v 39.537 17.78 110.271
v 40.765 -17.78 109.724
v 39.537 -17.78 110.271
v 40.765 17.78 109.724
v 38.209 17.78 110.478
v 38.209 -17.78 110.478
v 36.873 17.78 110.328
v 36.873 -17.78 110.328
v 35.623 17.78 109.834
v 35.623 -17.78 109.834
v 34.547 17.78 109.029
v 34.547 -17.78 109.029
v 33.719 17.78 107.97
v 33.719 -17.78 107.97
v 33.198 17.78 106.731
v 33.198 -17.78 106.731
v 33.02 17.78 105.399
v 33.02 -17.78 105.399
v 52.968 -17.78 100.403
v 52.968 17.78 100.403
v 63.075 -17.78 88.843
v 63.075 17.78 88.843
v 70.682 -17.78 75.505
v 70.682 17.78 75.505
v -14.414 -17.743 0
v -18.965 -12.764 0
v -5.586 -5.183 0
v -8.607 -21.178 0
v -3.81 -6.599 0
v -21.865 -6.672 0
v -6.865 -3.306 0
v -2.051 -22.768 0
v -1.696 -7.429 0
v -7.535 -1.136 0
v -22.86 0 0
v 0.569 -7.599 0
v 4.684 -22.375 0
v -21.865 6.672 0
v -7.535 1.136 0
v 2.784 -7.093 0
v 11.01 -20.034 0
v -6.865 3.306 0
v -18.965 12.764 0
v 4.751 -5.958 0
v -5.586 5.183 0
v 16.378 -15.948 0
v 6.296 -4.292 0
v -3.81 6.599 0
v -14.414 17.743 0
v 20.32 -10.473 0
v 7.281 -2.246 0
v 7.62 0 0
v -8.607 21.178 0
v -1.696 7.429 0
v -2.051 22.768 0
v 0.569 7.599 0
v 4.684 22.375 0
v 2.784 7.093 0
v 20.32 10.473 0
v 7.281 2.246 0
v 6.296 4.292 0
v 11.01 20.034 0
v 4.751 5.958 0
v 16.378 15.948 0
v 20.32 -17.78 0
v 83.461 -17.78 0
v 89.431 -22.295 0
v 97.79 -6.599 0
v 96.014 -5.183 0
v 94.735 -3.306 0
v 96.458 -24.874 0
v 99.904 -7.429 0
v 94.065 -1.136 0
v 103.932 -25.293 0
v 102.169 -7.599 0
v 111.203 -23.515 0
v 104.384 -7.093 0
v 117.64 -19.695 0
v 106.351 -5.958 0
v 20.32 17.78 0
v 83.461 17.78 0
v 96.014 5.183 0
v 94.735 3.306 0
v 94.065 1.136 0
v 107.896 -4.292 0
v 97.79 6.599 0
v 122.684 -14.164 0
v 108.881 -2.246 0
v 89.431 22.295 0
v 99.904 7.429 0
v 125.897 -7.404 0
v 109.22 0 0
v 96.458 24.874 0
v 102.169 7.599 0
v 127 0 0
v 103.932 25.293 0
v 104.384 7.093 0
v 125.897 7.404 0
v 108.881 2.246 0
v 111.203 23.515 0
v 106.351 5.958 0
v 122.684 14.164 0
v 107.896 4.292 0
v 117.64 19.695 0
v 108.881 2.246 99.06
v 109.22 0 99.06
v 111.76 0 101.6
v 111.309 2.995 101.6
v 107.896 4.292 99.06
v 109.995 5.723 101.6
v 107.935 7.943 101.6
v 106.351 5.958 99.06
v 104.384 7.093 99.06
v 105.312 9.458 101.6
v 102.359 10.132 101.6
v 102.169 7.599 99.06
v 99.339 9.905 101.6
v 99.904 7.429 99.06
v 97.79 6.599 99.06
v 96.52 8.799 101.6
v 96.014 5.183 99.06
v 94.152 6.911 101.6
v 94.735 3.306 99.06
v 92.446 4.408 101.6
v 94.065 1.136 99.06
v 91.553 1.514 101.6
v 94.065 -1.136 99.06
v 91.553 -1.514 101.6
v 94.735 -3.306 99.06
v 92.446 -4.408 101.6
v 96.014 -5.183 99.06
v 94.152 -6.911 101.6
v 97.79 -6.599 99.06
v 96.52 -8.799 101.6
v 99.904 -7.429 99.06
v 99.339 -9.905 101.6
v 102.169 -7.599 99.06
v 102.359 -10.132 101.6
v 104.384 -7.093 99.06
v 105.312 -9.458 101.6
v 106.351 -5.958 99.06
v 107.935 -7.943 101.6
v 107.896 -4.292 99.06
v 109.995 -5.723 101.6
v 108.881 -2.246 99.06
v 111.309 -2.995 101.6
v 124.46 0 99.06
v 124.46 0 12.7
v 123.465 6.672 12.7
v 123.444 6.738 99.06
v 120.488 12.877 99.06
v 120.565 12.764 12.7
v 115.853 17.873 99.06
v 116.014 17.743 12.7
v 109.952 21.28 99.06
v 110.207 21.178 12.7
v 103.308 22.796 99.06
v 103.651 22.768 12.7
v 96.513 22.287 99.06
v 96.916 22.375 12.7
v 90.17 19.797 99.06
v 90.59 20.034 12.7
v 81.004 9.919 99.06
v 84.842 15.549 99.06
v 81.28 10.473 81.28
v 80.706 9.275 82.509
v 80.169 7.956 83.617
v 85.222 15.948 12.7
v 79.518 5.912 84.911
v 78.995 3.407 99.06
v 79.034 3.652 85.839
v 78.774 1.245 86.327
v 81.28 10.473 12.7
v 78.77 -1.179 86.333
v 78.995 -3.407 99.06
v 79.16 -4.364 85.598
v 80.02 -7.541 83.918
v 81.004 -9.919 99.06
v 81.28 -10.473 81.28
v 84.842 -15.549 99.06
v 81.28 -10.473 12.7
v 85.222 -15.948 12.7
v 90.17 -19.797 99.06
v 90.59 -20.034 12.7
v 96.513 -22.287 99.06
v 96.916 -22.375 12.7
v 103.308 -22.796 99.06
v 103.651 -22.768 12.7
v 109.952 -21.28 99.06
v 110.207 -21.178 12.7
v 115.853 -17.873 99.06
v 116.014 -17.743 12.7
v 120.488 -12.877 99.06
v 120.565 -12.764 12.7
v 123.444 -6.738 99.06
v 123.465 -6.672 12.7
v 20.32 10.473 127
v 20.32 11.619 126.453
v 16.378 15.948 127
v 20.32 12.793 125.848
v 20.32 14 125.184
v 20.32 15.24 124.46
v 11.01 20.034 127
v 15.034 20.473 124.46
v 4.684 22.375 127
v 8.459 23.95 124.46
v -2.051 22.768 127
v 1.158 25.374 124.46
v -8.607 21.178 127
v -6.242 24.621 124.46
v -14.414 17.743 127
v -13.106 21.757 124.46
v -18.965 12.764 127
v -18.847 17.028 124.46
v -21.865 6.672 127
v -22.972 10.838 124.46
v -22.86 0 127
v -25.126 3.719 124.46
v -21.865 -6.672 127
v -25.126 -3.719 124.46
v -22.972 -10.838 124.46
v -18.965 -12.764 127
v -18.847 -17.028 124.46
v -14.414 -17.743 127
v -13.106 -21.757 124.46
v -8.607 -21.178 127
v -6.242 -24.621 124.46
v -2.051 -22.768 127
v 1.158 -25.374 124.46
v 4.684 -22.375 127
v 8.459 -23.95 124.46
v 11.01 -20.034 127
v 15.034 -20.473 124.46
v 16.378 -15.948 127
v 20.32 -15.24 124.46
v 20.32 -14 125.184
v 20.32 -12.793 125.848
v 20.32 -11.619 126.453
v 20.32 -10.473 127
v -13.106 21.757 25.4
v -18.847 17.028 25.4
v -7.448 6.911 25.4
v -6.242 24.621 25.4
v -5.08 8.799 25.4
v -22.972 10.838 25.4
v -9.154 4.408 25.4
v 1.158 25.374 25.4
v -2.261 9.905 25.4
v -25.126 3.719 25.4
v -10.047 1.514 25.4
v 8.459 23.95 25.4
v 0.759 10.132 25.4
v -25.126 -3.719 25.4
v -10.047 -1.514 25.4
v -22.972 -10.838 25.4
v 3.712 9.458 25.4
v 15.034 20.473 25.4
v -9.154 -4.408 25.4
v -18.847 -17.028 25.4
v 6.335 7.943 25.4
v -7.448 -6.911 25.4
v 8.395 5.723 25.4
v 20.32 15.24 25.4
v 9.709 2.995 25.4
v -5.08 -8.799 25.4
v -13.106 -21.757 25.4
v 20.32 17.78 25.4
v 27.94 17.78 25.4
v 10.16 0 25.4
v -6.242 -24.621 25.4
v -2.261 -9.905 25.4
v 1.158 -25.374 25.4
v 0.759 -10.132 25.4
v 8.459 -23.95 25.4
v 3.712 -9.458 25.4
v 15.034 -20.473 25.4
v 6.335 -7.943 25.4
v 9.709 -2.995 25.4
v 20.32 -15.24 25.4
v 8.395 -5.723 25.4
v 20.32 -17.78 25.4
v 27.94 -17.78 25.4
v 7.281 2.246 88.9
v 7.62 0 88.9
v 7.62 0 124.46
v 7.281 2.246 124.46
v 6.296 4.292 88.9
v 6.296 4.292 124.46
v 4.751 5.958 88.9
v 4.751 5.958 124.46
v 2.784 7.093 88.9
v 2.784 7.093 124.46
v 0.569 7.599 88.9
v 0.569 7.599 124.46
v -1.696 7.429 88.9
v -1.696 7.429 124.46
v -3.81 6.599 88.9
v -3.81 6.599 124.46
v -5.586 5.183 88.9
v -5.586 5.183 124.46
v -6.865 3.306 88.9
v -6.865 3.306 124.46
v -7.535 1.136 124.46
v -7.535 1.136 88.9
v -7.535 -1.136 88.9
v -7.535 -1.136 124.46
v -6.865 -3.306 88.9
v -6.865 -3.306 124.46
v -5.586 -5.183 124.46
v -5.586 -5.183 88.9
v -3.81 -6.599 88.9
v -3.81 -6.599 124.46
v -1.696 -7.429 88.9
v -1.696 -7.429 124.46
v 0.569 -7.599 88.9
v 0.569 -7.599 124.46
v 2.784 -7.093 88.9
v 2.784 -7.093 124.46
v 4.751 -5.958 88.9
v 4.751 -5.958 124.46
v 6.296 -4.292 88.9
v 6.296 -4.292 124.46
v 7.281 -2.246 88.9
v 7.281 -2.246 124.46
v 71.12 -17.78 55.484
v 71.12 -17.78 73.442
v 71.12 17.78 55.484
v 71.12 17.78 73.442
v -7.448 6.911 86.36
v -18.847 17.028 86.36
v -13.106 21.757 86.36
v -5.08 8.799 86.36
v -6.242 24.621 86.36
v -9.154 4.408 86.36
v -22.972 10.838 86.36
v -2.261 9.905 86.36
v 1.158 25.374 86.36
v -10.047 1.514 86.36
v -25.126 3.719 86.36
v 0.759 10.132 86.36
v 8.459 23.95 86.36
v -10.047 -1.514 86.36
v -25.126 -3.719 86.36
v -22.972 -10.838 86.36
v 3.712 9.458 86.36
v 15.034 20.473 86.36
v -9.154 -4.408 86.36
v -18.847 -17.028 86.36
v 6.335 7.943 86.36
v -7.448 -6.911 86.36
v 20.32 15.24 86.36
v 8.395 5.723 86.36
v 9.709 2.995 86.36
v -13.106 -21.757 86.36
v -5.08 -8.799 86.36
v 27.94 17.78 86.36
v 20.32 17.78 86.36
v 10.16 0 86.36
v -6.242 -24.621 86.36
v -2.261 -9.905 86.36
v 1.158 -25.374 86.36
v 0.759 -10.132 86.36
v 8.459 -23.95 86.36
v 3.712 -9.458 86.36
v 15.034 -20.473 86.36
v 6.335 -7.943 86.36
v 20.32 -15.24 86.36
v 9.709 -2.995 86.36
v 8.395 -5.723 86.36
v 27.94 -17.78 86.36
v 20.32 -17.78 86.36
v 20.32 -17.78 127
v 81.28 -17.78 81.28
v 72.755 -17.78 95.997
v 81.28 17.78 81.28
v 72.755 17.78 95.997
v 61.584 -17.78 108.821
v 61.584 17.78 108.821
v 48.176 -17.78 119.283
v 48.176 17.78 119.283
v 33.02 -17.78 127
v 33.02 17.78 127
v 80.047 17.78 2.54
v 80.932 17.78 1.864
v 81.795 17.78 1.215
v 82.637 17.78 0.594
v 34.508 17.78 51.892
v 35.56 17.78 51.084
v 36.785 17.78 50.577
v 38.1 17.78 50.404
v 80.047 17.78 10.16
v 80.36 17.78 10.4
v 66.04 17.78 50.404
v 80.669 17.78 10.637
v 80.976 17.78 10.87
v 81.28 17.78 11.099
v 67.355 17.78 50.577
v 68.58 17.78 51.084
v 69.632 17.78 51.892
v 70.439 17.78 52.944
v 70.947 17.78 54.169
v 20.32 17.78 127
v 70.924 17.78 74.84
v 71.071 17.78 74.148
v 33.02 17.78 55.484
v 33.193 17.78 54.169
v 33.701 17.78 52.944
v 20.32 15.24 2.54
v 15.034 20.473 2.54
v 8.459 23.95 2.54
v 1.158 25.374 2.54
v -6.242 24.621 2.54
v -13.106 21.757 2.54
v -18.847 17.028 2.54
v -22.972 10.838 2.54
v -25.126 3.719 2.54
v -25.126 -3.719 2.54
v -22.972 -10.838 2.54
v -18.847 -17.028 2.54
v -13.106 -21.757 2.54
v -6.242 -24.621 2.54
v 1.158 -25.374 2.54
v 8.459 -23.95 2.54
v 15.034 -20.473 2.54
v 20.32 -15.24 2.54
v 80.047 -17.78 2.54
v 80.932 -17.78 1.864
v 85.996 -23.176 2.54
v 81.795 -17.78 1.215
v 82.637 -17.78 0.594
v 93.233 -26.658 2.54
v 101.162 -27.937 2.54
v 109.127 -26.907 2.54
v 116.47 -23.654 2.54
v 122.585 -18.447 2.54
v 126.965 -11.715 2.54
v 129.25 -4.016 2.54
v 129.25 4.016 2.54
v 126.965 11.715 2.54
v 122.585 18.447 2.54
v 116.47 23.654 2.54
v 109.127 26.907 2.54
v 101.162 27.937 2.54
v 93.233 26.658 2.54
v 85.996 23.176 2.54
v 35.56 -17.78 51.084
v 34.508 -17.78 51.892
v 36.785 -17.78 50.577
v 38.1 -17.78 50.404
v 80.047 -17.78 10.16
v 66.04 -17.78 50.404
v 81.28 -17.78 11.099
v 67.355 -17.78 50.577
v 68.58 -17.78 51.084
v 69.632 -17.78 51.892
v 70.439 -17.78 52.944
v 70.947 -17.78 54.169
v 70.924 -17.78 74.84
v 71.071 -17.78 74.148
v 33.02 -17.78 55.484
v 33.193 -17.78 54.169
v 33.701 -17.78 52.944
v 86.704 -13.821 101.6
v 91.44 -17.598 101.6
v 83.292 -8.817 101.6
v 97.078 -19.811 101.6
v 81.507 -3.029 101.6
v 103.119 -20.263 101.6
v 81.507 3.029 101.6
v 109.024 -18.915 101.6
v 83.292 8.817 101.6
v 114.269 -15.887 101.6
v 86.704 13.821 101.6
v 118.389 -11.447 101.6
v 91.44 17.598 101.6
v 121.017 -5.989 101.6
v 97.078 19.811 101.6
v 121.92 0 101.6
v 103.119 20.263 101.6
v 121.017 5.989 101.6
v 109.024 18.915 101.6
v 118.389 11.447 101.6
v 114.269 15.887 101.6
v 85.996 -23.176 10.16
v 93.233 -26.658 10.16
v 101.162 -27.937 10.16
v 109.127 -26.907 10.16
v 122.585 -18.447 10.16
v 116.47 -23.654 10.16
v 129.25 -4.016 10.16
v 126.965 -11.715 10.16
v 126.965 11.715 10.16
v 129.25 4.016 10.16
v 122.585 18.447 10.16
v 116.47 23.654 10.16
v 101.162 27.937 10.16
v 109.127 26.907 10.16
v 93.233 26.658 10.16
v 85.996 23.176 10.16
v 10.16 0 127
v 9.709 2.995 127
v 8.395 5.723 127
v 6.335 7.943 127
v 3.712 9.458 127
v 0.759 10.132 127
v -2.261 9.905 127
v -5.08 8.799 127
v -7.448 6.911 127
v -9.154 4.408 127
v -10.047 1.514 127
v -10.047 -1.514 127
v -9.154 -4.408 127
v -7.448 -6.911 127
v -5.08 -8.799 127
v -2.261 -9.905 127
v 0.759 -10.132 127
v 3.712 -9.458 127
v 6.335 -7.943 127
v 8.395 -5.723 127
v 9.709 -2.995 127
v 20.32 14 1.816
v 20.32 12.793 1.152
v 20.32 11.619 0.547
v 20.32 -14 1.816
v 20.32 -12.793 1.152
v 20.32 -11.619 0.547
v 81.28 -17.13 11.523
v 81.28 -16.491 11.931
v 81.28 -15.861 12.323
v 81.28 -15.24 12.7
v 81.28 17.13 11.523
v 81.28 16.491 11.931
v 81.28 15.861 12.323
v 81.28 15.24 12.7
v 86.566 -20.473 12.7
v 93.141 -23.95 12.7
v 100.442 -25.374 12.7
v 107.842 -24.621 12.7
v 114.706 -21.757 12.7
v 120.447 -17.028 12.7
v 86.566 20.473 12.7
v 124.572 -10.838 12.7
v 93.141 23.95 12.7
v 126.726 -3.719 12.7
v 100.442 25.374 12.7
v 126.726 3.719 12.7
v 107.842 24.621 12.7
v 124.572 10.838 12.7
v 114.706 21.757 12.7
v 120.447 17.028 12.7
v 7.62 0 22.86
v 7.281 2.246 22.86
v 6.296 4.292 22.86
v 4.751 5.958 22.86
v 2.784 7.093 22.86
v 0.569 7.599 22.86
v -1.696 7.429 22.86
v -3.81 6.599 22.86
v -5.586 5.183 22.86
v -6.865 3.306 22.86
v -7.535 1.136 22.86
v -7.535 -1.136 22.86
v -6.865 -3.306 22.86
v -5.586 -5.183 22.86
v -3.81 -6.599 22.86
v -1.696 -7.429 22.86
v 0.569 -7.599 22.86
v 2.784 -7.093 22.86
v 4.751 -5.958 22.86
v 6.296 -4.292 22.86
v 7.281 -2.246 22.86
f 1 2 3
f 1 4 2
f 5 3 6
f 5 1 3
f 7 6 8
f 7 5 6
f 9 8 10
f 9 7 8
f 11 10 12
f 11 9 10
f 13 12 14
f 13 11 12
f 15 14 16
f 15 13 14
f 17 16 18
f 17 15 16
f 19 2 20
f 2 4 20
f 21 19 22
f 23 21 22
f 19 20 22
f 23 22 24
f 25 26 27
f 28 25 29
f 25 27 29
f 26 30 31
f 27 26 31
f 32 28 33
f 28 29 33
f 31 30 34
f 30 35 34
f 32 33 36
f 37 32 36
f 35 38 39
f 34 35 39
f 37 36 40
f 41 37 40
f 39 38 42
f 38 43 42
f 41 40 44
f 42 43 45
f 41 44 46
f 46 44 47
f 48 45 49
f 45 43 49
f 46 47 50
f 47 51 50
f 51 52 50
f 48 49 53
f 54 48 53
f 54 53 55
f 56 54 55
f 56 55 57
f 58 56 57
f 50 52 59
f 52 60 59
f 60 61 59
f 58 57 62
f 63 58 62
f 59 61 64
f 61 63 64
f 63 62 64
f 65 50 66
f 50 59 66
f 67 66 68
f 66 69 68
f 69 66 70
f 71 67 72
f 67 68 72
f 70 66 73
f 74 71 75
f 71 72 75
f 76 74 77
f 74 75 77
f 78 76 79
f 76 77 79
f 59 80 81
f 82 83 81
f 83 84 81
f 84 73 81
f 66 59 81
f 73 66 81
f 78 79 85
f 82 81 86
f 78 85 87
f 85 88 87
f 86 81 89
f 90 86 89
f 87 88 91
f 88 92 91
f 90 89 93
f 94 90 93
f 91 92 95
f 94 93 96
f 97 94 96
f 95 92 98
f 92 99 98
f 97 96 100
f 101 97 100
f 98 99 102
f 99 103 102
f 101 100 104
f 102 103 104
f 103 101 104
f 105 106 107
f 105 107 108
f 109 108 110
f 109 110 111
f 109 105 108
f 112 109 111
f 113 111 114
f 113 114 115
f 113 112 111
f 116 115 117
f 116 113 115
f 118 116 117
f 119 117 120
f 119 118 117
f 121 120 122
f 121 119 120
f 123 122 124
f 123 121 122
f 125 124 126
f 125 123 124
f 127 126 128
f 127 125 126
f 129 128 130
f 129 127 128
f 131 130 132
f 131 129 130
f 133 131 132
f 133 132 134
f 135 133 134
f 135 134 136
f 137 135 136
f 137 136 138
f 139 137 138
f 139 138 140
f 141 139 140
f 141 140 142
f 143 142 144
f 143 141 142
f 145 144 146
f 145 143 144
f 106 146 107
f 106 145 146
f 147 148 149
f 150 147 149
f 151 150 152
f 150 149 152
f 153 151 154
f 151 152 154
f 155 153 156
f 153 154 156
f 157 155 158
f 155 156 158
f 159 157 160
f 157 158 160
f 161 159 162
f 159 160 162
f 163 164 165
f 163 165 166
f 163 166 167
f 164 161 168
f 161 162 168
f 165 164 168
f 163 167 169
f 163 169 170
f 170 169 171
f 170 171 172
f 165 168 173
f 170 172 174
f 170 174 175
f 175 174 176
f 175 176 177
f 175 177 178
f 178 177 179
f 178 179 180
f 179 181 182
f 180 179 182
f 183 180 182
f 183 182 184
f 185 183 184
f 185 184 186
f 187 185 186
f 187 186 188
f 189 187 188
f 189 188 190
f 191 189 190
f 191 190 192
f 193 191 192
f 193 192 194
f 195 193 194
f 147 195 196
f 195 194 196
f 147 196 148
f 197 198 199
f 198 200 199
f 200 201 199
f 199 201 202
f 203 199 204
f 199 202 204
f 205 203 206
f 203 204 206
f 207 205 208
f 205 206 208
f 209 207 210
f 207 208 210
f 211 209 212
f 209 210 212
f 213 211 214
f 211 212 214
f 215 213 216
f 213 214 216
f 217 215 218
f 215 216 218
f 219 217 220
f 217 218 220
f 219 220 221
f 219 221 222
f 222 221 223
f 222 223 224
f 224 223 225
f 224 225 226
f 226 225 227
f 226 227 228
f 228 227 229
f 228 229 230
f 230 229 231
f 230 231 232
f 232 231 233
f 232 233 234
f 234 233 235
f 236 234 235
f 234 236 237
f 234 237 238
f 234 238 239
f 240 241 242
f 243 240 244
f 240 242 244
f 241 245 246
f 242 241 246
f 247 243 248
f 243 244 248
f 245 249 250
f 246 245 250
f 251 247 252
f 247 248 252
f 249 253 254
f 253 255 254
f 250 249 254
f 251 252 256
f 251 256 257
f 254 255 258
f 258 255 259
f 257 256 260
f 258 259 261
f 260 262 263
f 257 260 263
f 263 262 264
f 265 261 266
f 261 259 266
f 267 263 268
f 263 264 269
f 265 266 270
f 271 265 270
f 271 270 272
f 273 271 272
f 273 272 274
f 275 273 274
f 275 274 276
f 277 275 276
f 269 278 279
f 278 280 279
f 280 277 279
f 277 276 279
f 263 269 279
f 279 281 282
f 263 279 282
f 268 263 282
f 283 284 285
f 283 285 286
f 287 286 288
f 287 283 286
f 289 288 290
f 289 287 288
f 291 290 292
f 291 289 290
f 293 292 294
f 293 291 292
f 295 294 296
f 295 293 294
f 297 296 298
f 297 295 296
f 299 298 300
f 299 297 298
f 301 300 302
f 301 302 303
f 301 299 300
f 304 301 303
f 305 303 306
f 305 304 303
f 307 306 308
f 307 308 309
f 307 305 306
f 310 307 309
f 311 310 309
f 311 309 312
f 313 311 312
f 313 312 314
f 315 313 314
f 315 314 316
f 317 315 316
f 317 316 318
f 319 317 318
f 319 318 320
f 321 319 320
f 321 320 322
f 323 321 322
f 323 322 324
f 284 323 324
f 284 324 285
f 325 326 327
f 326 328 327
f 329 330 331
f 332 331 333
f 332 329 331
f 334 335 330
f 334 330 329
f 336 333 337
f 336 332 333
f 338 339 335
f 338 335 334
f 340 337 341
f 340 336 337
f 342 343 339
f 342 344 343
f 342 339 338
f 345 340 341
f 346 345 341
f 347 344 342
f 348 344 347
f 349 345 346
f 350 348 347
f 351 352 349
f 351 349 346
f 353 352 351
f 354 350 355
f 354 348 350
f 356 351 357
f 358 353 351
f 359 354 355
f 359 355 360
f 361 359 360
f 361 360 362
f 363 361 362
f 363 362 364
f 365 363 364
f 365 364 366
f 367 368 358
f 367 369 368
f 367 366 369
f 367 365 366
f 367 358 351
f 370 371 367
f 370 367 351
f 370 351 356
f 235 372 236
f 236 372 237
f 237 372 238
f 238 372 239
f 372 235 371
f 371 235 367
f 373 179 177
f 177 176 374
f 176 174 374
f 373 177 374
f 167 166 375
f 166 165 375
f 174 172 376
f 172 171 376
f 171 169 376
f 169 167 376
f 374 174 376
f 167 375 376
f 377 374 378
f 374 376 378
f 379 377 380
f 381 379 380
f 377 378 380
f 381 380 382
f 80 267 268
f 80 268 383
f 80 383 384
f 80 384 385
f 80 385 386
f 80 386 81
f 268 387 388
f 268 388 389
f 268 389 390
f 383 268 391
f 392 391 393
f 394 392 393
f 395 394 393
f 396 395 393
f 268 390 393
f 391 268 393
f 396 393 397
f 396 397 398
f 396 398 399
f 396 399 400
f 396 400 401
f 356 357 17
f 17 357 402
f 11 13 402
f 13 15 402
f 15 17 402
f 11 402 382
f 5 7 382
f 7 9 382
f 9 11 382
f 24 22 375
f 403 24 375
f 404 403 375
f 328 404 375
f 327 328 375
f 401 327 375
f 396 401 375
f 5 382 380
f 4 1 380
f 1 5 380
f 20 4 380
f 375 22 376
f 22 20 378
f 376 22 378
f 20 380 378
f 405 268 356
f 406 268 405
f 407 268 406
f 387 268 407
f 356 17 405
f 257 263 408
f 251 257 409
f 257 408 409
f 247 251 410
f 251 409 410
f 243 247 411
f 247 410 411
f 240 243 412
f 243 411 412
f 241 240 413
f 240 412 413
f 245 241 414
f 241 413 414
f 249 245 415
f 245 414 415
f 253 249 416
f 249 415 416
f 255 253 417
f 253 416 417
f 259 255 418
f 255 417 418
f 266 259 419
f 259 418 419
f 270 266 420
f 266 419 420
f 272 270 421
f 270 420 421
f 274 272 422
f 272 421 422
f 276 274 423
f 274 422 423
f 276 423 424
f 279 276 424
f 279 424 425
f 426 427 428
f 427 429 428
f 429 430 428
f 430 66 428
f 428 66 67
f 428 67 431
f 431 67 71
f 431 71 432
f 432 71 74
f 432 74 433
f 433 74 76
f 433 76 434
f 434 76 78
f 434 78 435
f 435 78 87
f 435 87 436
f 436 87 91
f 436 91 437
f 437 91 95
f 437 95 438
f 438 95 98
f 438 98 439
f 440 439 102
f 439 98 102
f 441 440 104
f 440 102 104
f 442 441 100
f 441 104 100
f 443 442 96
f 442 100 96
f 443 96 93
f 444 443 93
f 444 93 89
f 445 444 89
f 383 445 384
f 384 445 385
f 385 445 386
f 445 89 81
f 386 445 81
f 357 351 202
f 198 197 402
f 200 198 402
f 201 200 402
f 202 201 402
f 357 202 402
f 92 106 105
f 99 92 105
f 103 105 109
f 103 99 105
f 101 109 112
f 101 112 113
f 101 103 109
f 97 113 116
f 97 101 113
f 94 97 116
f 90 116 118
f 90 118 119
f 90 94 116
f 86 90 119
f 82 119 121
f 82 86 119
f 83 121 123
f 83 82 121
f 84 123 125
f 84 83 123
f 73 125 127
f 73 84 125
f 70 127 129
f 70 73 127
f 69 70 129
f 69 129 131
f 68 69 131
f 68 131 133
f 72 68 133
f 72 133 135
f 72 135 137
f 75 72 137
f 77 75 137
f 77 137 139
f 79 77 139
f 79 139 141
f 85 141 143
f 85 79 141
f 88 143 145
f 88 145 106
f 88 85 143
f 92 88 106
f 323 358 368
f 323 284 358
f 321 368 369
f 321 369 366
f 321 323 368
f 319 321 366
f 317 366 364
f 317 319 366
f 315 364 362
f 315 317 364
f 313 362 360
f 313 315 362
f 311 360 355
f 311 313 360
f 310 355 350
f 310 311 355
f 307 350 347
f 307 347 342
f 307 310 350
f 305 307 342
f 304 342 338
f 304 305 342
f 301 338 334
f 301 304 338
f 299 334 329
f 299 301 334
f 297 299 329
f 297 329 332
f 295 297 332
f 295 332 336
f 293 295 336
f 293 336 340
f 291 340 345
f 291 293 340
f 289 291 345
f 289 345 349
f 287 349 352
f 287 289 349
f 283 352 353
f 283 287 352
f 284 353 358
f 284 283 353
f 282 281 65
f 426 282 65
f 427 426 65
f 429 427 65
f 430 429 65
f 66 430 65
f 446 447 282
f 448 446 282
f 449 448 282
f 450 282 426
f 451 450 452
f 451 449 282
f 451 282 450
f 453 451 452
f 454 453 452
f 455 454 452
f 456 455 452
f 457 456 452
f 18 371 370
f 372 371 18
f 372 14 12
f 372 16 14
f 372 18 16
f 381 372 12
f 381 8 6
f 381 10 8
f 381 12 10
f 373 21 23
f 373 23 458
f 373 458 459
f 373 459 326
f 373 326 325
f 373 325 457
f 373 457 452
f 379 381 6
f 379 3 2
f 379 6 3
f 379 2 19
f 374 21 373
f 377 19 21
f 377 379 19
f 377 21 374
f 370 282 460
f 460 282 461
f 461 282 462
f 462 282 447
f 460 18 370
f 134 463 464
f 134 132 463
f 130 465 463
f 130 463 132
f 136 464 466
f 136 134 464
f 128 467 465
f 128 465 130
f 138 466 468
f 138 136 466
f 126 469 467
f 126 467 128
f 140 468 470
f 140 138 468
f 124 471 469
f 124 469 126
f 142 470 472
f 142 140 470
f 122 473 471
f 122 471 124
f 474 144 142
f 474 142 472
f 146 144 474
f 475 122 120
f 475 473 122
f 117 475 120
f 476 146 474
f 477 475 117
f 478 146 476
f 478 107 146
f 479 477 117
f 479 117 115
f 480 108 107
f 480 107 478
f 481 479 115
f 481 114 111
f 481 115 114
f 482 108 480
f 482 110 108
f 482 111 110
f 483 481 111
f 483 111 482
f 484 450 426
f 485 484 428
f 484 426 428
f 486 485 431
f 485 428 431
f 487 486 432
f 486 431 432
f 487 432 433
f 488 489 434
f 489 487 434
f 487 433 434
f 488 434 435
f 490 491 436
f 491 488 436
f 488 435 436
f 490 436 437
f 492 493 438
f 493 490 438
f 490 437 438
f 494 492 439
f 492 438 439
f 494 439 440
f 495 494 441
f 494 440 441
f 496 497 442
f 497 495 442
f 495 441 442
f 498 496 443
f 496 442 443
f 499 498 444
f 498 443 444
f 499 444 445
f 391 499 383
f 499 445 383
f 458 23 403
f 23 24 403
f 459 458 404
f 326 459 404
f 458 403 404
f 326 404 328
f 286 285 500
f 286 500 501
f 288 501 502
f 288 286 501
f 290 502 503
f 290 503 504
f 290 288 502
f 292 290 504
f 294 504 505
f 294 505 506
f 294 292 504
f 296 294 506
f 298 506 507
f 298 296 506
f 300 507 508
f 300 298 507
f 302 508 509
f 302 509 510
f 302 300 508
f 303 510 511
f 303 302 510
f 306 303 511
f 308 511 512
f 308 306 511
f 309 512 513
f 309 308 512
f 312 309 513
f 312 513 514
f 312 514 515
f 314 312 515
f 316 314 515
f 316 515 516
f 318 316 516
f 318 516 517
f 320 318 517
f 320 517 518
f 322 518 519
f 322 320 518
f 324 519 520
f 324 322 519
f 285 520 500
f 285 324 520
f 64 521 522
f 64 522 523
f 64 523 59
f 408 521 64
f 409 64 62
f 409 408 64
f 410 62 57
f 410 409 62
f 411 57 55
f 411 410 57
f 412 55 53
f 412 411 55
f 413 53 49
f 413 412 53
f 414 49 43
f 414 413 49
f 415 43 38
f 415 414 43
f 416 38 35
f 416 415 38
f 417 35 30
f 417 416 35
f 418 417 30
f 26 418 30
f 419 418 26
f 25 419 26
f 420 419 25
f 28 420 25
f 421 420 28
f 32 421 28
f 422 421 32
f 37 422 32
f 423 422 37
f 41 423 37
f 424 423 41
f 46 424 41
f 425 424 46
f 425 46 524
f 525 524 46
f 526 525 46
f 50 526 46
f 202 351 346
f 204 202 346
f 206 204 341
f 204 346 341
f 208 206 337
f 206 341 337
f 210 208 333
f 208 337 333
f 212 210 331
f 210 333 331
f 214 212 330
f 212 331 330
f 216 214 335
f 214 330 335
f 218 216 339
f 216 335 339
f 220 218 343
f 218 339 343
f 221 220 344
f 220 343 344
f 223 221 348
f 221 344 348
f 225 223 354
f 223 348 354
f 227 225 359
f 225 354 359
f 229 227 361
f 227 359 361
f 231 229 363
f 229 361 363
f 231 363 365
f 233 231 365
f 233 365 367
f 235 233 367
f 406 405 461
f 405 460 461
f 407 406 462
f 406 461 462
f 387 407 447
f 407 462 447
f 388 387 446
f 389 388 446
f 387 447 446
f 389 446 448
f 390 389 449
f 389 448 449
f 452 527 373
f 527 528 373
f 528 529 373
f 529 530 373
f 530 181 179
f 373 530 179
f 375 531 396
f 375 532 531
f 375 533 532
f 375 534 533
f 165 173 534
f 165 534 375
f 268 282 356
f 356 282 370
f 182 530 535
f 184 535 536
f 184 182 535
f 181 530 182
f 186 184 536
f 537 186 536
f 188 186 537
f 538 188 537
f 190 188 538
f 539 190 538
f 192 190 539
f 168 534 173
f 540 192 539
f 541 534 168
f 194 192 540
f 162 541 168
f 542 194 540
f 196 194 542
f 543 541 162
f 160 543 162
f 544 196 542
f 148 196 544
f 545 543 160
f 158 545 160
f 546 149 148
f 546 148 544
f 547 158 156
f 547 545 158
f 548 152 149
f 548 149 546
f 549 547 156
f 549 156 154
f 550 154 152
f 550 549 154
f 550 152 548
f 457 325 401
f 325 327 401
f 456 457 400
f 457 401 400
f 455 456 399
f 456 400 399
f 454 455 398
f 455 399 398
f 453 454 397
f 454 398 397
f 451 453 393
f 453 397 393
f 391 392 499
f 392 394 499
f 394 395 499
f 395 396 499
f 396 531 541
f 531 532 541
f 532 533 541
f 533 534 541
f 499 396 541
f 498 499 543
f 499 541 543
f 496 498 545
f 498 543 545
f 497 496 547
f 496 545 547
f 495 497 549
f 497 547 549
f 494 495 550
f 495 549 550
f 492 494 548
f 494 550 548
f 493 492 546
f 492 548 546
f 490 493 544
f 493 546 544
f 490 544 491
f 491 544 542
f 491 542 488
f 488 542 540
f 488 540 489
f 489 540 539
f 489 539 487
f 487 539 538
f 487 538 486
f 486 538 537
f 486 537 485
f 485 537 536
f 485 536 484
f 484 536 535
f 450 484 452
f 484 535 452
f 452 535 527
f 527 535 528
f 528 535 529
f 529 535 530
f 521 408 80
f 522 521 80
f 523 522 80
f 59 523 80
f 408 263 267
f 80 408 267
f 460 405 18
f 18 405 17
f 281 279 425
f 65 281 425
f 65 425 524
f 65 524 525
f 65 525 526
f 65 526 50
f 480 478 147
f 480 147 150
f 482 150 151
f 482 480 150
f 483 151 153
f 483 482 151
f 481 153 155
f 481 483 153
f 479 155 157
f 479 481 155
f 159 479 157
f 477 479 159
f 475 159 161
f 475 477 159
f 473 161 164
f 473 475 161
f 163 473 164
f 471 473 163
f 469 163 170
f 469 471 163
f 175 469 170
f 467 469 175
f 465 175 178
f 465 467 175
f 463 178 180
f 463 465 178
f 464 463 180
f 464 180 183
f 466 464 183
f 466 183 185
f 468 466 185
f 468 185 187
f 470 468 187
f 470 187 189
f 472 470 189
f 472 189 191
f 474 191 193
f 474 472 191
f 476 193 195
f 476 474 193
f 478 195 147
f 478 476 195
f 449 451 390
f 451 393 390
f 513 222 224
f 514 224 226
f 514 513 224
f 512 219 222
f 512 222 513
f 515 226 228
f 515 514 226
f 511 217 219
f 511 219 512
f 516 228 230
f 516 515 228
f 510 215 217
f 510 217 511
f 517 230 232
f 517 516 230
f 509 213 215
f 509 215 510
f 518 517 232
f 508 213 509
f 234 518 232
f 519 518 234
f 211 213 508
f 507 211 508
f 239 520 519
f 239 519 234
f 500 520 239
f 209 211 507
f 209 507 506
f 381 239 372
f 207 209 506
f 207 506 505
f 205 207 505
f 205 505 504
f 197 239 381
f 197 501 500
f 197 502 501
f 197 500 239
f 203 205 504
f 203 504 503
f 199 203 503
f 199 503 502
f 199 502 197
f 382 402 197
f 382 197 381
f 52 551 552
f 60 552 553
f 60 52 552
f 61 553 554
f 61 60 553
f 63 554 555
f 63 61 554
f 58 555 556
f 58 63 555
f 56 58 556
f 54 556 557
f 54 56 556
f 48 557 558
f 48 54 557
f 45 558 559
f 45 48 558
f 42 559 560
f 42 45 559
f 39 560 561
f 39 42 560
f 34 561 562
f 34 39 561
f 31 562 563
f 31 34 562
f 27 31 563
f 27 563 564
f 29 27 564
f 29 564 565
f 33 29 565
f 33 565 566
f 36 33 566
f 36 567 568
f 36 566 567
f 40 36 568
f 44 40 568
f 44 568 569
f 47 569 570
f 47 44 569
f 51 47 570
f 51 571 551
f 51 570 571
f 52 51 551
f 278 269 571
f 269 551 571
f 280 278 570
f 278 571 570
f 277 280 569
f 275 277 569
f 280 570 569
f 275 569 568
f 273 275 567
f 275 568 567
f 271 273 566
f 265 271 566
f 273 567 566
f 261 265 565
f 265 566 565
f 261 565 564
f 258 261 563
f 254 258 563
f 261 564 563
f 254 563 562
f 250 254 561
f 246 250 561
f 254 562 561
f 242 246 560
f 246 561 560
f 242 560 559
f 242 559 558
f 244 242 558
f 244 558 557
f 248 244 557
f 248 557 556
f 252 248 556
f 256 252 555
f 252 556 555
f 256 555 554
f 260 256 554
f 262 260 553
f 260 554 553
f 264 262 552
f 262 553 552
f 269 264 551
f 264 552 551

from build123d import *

# Parameters (mm, degrees)
F0_R          = 25.4
F0_R_2        = 7.62
F1_DEPTH      = 127
F0_R_3        = 22.86
F2_DEPTH      = 101.6
F4_DEPTH      = 17.78
F4_DEPTH_BACK = 17.78
F5_W          = 60.96
F5_H          = 60.96
F6_DEPTH      = 25.4
F6_DEPTH_BACK = 25.4
F7_R          = 5.08
F8_T4_ANGLE   = 315.8495903275
F8_T13_ANGLE  = 315.8495903275
F9_R          = 27.94
F9_R_2        = 22.86
F10_DEPTH     = 12.7
F11_SIZE      = 2.54


# Not quite as in the source:
# - a fillet or chamfer that OpenCascade refuses, or shapes differently, is made with other operations: its cross-section is extruded or revolved along the edge and cut away or added


with BuildPart() as f1:
    # F0 (on Top) → F1 (new body)
    with BuildSketch(Plane.XY):
        Circle(F0_R)
        Circle(F0_R_2, mode=Mode.SUBTRACT)
    extrude(amount=F1_DEPTH)



with BuildPart() as f2:
    # F0 (on Top) → F2 (new body)
    with BuildSketch(Plane.XY):
        with Locations((101.6, 0)):
            Circle(F0_R_3)
        with Locations((101.6, 0)):
            Circle(F0_R_2, mode=Mode.SUBTRACT)
    extrude(amount=F2_DEPTH)


with BuildPart() as f1_1:
    add(f1.part)

    add(f2.part)  # F4 merges F2
    # F3 (on Front) → F4 (join, two sides)
    with BuildSketch(Plane.XZ) as f4_sk:
        with BuildLine():
            Line((20.32, 127), (20.32, 0))
            Line((20.32, 0), (81.28, 0))
            Line((81.28, 0), (81.28, 81.28))
            ThreePointArc((81.28, 81.28), (61.5844056789, 108.82076155), (33.02, 127))
            Line((33.02, 127), (20.32, 127))
        make_face()
        with BuildLine():
            Line((33.02, 50.4039023765), (33.02, 113.9039023765))
            ThreePointArc((33.02, 113.9039023765), (55.7015227305, 97.7137904926), (71.12, 74.5008252602))
            Line((71.12, 74.5008252602), (71.12, 50.4039023765))
            Line((71.12, 50.4039023765), (33.02, 50.4039023765))
        make_face(mode=Mode.SUBTRACT)
    extrude(amount=F4_DEPTH)
    extrude(f4_sk.sketch, amount=-F4_DEPTH_BACK)

    # F5 (on Front) → F6 (cut, two sides)
    with BuildSketch(Plane.XZ) as f6_sk:
        with Locations((-2.54, 55.88)):
            Rectangle(F5_W, F5_H)
    extrude(amount=F6_DEPTH, mode=Mode.SUBTRACT)
    extrude(f6_sk.sketch, amount=-F6_DEPTH_BACK, mode=Mode.SUBTRACT)

    # F7
    f7_edges = [f1_1.edges().sort_by_distance(p)[0] for p in [
        (33.02, 0, 113.903902),
        (33.02, 0, 50.403902),
        (71.12, 0, 50.403902),
        (71.12, 0, 74.500825),
    ]]
    fillet(f7_edges, radius=F7_R)

    # F8: chamfer of 2.54 on 4 edges, made by hand


with BuildPart() as f8_tool2:
    # F8_s3 → F8_t4 (revolve)
    with BuildSketch(Plane(origin=(0, 0, 0), x_dir=(0, 0, 1), z_dir=(0.3758232659, -0.9266913579, 0))):
        Polygon((0, -22.86), (2.54, -25.4), (0, -25.4), align=None)
    revolve(axis=Axis((0, 0, 0), (0, 0, 1)), revolution_arc=F8_T4_ANGLE)

    split(bisect_by=Plane.YZ.offset(20.32), keep=Keep.BOTTOM)


with BuildPart() as f1_2:
    add(f1_1.part)

    # F8_t1: cut F8_tool2
    add(f8_tool2.part, mode=Mode.SUBTRACT)

    # F8_s6 → F8_t7 (revolve, cut)
    with BuildSketch(Plane.XZ):
        Polygon((10.16, 25.4), (7.62, 22.86), (7.62, 25.4), align=None)
    revolve(axis=Axis((0, 0, 25.4), (0, 0, -1)), mode=Mode.SUBTRACT)

    # F8_s8 → F8_t9 (revolve, cut)
    with BuildSketch(Plane.XZ):
        Polygon((10.16, 86.36), (7.62, 88.9), (7.62, 86.36), align=None)
    revolve(axis=Axis((0, 0, 86.36), (0, 0, -1)), mode=Mode.SUBTRACT)


with BuildPart() as f8_tool11:
    # F8_s12 → F8_t13 (revolve)
    with BuildSketch(Plane(origin=(0, 0, 0), x_dir=(0, 0, 1), z_dir=(0.3758232659, -0.9266913579, 0))):
        Polygon((127, -22.86), (124.46, -25.4), (127, -25.4), align=None)
    revolve(axis=Axis((0, 0, 127), (0, 0, 1)), revolution_arc=F8_T13_ANGLE)

    split(bisect_by=Plane.YZ.offset(20.32), keep=Keep.BOTTOM)


with BuildPart() as f1_3:
    add(f1_2.part)

    # F8_t10: cut F8_tool11
    add(f8_tool11.part, mode=Mode.SUBTRACT)

    # F9 (on Top) → F10 (join)
    with BuildSketch(Plane.XY):
        with Locations((101.6, 0)):
            Circle(F9_R)
        with Locations((101.6, 0)):
            Circle(F9_R_2, mode=Mode.SUBTRACT)
    extrude(amount=F10_DEPTH)

    # F11
    f11_edges = [f1_3.edges().sort_by_distance(p)[0] for p in [
        (129.54, 0, 0),
        (129.54, 0, 12.7),
        (78.74, 0, 101.6),
        (93.98, 0, 101.6),
        (-7.62, 0, 127),
    ]]
    chamfer(f11_edges, length=F11_SIZE)


solid = f1_3.part
